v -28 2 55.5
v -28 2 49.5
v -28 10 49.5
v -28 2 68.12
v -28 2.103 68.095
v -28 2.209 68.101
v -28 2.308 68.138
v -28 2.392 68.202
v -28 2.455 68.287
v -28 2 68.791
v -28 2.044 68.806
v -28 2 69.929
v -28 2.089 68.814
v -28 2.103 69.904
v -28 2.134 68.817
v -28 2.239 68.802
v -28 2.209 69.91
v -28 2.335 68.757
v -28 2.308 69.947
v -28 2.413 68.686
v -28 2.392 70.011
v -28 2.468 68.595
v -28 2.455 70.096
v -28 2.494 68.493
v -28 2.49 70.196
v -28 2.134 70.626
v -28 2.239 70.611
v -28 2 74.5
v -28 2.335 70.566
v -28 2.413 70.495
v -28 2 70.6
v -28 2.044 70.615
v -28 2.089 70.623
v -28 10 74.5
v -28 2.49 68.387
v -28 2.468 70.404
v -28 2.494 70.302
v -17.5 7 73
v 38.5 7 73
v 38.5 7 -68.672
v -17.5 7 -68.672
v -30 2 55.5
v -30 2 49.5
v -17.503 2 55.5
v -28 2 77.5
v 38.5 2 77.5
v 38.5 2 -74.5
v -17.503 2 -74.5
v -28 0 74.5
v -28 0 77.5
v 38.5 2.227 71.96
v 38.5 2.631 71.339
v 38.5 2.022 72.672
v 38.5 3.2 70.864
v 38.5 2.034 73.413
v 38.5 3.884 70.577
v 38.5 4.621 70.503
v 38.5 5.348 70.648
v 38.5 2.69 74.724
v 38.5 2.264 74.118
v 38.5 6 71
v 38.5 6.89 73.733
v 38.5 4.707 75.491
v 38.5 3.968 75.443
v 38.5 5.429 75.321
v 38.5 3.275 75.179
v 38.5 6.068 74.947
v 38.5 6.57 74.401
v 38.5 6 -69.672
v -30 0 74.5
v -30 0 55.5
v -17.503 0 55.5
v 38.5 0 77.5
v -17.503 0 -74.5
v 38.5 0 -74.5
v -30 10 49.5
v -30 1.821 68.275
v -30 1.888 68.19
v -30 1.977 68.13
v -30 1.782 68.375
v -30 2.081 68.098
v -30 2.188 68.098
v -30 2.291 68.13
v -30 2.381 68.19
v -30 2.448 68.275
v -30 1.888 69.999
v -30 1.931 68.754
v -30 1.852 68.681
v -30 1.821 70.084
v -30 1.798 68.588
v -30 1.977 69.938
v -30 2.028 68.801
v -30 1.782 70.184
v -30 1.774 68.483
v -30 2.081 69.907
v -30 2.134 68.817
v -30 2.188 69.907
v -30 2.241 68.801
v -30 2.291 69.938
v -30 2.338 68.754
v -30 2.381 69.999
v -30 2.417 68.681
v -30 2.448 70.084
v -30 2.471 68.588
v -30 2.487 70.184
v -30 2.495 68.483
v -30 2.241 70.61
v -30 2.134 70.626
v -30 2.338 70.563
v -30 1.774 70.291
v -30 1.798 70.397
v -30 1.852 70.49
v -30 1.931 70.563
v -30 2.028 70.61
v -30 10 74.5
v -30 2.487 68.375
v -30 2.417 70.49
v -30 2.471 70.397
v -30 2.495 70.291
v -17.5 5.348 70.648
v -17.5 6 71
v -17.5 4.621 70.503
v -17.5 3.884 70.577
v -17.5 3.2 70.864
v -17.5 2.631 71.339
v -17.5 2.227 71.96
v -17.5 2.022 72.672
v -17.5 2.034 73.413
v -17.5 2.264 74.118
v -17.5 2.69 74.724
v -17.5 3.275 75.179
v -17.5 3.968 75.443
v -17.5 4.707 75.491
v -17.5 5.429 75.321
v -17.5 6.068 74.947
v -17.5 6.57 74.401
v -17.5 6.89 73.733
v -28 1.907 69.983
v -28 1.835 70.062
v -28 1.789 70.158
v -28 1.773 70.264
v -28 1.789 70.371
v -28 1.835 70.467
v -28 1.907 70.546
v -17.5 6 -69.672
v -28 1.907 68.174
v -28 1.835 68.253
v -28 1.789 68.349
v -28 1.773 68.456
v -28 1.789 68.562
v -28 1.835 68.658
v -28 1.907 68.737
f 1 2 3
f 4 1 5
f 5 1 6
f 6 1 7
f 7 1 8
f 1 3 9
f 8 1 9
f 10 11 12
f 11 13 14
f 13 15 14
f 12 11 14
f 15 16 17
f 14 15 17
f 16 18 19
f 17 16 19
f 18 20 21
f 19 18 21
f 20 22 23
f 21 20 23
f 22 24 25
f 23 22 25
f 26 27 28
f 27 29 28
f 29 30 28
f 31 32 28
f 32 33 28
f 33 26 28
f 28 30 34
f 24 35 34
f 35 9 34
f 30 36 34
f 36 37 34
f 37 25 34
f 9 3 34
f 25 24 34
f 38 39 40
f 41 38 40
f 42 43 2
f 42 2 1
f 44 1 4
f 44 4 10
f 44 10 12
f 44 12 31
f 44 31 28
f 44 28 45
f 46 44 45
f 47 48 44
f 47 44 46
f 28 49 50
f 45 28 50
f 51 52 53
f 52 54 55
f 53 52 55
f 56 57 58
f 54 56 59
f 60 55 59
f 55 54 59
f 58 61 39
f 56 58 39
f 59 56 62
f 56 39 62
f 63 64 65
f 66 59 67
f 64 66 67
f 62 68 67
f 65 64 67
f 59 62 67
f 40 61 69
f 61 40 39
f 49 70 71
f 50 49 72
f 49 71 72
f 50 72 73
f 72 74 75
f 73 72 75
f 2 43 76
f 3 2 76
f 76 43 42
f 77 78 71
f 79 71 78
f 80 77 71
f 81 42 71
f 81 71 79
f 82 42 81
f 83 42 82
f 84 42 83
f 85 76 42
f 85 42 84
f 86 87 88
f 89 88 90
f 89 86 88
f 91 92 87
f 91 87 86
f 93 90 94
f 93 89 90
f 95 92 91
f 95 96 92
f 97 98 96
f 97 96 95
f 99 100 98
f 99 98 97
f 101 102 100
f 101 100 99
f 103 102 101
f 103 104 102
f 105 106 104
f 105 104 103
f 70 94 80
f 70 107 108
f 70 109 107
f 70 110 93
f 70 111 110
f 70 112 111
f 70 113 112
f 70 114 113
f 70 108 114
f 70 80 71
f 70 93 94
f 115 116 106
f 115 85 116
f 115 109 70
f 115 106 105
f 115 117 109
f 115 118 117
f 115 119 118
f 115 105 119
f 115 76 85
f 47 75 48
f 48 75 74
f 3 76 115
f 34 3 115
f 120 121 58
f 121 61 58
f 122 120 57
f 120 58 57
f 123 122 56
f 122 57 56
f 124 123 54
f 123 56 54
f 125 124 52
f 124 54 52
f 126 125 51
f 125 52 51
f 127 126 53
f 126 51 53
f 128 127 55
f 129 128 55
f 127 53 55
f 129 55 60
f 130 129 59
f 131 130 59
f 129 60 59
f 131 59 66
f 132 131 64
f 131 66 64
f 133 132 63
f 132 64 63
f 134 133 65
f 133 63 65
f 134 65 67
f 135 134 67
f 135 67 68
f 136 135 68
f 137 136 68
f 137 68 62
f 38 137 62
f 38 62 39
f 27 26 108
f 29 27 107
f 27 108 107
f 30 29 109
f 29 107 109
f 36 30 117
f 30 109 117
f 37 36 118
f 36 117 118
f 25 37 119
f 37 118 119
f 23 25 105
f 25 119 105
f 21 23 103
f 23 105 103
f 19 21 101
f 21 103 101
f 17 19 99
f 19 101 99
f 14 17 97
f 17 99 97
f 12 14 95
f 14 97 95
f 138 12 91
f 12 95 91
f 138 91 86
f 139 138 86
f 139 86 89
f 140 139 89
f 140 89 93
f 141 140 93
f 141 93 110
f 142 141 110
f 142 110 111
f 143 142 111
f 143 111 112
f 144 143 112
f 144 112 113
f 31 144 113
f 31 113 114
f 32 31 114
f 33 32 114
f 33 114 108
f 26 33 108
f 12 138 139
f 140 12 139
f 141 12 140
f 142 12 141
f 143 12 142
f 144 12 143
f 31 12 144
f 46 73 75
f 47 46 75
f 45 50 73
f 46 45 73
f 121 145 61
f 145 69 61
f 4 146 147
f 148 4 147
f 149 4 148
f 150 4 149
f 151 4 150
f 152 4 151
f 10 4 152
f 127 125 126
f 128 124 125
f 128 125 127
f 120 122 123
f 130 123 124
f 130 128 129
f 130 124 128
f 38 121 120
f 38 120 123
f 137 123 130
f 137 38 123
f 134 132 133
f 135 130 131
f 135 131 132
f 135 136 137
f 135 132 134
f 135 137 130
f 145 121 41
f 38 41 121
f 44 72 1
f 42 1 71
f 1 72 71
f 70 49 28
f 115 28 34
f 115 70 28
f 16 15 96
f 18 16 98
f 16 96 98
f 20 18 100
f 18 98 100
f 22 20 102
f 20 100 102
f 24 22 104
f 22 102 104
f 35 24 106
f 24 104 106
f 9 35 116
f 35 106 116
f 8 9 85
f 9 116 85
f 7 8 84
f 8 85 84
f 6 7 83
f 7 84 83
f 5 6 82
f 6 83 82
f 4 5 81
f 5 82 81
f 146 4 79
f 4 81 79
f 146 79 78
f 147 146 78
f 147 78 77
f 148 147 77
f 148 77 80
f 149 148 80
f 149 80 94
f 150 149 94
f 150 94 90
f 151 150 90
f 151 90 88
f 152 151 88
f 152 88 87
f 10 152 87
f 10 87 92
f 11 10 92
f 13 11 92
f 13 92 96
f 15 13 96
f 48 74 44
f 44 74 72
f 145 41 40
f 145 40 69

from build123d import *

# Parameters (mm, degrees)
BOSS_EXTRUDE1_DEPTH = 2
SKETCH2_W           = 25
SKETCH2_H           = 8
BOSS_EXTRUDE2_DEPTH = 2
SKETCH3_R           = 0.361818182
CUT_EXTRUDE1_DEPTH  = 2
BOSS_EXTRUDE4_DEPTH = 28


with BuildPart() as part:
    # Sketch1 → Boss-Extrude1 (new body)
    with BuildSketch(Plane(origin=(0, 0, 0), x_dir=(1, 0, 0), z_dir=(0, 1, 0))):
        Polygon((-30, -74.5), (-28, -74.5), (-28, -77.5), (38.5, -77.5), (38.5, 74.5), (-17.503169207, 74.5), (-17.503169207, -55.5), (-30, -55.5), align=None)
    extrude(amount=BOSS_EXTRUDE1_DEPTH)

    # Sketch2 → Boss-Extrude2 (add)
    with BuildSketch(Plane.ZY.offset(30)):
        with Locations((62, 6)):
            Rectangle(SKETCH2_W, SKETCH2_H)
    extrude(amount=-BOSS_EXTRUDE2_DEPTH)

    # Sketch3 → Cut-Extrude1 (cut)
    with BuildSketch(Plane.ZY.offset(30)):
        with Locations((68.455544804, 2.134454992)):
            Circle(SKETCH3_R)
        with Locations((70.264435843, 2.134454992)):
            Circle(SKETCH3_R)
    extrude(amount=-CUT_EXTRUDE1_DEPTH, mode=Mode.SUBTRACT)


with BuildPart() as body_2:
    # Sketch4 → Boss-Extrude4 (new, symmetric)
    with BuildSketch(Plane(origin=(10.5, 0, 0), x_dir=(0, 0, -1), z_dir=(1, 0, 0))):
        with BuildLine():
            Line((68.671572875, 7), (69.671572875, 6))
            Line((69.671572875, 6), (-71, 6))
            ThreePointArc((-71, 6), (-74.118033989, 2.263932023), (-73, 7))
            Line((-73, 7), (68.671572875, 7))
        make_face()
    extrude(amount=BOSS_EXTRUDE4_DEPTH, both=True)


solid = Compound([part.part, body_2.part])
